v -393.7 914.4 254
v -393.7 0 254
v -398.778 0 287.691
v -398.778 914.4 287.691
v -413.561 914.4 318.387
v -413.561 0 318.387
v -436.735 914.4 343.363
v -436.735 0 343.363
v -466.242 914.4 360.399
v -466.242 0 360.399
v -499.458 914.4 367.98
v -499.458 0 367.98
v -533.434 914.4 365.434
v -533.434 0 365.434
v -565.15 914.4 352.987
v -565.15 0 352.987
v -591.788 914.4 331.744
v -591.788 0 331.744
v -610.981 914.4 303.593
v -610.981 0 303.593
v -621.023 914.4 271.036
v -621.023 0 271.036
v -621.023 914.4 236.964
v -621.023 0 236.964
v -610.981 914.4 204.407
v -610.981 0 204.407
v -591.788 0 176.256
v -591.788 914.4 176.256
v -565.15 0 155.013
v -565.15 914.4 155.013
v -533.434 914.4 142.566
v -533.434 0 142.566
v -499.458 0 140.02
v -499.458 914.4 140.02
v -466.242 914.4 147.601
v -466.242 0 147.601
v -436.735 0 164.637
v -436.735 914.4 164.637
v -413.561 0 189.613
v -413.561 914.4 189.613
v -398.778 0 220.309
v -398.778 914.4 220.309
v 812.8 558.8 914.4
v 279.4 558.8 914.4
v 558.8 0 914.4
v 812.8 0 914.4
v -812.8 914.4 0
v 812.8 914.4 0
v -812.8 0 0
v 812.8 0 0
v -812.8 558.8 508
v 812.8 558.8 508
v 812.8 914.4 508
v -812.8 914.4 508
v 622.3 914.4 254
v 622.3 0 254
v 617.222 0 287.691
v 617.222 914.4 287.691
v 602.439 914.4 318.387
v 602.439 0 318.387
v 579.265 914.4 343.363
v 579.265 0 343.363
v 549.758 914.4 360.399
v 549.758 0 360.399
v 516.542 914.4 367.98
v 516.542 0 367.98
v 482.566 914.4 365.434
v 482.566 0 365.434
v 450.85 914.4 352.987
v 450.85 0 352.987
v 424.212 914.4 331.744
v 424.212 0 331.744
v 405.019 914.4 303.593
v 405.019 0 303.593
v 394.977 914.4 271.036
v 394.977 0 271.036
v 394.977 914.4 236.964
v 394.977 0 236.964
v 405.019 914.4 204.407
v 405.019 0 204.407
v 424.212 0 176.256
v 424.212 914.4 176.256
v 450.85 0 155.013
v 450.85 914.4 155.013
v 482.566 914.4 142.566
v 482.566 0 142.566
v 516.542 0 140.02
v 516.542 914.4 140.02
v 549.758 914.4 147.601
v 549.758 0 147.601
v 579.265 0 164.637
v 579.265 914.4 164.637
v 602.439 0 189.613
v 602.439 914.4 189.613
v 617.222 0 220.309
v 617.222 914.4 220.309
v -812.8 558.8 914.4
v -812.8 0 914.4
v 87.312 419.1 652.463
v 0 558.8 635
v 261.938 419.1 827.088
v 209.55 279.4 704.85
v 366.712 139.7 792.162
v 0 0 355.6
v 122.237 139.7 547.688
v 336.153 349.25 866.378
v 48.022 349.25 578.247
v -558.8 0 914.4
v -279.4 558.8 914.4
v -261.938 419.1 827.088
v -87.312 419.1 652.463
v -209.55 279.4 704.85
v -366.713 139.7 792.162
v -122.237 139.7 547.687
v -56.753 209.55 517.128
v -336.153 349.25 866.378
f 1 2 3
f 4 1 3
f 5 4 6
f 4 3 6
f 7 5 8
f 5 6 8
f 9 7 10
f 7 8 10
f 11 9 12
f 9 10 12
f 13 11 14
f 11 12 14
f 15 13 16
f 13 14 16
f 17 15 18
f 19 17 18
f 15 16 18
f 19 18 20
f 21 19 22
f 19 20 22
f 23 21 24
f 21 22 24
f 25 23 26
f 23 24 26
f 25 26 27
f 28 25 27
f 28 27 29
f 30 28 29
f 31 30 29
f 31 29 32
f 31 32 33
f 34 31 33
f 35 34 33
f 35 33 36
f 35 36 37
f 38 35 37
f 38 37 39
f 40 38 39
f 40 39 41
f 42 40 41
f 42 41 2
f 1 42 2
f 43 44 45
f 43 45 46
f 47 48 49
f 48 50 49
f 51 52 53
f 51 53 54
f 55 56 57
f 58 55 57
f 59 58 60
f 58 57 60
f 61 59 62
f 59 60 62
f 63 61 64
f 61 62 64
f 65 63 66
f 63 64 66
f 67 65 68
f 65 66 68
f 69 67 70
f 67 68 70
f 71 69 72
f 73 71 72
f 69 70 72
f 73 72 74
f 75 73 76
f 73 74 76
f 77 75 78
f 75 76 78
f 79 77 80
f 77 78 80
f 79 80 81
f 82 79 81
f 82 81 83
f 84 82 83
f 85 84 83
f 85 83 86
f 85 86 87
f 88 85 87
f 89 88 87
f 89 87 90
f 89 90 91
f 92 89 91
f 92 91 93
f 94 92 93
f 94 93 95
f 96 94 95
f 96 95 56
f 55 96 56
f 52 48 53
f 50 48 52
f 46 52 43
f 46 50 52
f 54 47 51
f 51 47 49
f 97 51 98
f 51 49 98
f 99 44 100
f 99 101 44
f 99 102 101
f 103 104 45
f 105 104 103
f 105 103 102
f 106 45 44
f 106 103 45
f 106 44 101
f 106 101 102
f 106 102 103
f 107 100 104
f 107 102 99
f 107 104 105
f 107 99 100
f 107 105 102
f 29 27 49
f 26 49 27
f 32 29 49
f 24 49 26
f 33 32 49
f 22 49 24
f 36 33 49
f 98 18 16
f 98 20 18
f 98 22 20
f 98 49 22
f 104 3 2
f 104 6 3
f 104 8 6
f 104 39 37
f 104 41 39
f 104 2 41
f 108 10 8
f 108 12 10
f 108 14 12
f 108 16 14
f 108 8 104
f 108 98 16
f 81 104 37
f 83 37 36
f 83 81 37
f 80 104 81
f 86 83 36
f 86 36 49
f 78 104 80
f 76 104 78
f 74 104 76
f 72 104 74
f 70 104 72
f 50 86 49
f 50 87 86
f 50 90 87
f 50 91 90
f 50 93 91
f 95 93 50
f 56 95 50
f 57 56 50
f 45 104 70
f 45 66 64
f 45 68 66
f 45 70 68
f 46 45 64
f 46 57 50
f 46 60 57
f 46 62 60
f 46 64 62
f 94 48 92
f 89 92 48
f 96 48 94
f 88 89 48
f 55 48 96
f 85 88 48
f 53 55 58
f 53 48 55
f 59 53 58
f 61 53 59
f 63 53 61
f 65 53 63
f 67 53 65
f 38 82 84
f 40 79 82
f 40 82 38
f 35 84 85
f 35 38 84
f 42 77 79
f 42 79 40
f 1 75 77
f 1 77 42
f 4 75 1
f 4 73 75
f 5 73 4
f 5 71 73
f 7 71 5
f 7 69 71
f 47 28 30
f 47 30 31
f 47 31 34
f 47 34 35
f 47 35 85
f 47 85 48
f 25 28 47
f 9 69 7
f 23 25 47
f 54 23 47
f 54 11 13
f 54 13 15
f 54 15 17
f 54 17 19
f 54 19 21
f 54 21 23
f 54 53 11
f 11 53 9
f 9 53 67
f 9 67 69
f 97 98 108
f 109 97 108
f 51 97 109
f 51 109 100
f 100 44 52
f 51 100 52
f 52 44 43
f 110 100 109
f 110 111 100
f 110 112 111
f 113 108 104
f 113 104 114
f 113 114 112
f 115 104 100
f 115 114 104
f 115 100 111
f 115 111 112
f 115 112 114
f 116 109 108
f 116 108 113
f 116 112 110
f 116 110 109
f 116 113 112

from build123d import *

# Parameters (mm, degrees)
F0_W     = 1625.6
F0_H     = 914.4
F1_DEPTH = 558.8
F2_W     = 1625.6
F2_H     = 508
F3_DEPTH = 355.6
F7_R     = 114.3
F8_DEPTH = 914.401


with BuildPart() as f1:
    # F0 (on Front) → F1 (new body)
    with BuildSketch(Plane.XZ):
        with Locations((0, 457.2)):
            Rectangle(F0_W, F0_H)
    extrude(amount=-F1_DEPTH)

    # F2 (on face) → F3 (join)
    with BuildSketch(Plane(origin=(0, 558.8, 0), x_dir=(-1, 0, 0), z_dir=(0, 1, 0))):
        with Locations((0, 254)):
            Rectangle(F2_W, F2_H)
    extrude(amount=F3_DEPTH)

    # F5 (on face) → F6 section 0
    with BuildSketch(Plane(origin=(0, 558.8, 0), x_dir=(-1, 0, 0), z_dir=(0, 1, 0))):
        Polygon((279.4, 914.4), (-279.4, 914.4), (0, 635), align=None)
    # F4 (on face) → F6 section 1
    with BuildSketch(Plane.XZ):
        Polygon((558.8, 914.4), (-558.8, 914.4), (0, 355.6), align=None)
    loft(mode=Mode.SUBTRACT)

    # F7 (on face) → F8 (cut, through all)
    with BuildSketch(Plane.XZ):
        with Locations((-508, 254)):
            Circle(F7_R)
        with Locations((508, 254)):
            Circle(F7_R)
    extrude(amount=-F8_DEPTH, mode=Mode.SUBTRACT)


solid = f1.part
